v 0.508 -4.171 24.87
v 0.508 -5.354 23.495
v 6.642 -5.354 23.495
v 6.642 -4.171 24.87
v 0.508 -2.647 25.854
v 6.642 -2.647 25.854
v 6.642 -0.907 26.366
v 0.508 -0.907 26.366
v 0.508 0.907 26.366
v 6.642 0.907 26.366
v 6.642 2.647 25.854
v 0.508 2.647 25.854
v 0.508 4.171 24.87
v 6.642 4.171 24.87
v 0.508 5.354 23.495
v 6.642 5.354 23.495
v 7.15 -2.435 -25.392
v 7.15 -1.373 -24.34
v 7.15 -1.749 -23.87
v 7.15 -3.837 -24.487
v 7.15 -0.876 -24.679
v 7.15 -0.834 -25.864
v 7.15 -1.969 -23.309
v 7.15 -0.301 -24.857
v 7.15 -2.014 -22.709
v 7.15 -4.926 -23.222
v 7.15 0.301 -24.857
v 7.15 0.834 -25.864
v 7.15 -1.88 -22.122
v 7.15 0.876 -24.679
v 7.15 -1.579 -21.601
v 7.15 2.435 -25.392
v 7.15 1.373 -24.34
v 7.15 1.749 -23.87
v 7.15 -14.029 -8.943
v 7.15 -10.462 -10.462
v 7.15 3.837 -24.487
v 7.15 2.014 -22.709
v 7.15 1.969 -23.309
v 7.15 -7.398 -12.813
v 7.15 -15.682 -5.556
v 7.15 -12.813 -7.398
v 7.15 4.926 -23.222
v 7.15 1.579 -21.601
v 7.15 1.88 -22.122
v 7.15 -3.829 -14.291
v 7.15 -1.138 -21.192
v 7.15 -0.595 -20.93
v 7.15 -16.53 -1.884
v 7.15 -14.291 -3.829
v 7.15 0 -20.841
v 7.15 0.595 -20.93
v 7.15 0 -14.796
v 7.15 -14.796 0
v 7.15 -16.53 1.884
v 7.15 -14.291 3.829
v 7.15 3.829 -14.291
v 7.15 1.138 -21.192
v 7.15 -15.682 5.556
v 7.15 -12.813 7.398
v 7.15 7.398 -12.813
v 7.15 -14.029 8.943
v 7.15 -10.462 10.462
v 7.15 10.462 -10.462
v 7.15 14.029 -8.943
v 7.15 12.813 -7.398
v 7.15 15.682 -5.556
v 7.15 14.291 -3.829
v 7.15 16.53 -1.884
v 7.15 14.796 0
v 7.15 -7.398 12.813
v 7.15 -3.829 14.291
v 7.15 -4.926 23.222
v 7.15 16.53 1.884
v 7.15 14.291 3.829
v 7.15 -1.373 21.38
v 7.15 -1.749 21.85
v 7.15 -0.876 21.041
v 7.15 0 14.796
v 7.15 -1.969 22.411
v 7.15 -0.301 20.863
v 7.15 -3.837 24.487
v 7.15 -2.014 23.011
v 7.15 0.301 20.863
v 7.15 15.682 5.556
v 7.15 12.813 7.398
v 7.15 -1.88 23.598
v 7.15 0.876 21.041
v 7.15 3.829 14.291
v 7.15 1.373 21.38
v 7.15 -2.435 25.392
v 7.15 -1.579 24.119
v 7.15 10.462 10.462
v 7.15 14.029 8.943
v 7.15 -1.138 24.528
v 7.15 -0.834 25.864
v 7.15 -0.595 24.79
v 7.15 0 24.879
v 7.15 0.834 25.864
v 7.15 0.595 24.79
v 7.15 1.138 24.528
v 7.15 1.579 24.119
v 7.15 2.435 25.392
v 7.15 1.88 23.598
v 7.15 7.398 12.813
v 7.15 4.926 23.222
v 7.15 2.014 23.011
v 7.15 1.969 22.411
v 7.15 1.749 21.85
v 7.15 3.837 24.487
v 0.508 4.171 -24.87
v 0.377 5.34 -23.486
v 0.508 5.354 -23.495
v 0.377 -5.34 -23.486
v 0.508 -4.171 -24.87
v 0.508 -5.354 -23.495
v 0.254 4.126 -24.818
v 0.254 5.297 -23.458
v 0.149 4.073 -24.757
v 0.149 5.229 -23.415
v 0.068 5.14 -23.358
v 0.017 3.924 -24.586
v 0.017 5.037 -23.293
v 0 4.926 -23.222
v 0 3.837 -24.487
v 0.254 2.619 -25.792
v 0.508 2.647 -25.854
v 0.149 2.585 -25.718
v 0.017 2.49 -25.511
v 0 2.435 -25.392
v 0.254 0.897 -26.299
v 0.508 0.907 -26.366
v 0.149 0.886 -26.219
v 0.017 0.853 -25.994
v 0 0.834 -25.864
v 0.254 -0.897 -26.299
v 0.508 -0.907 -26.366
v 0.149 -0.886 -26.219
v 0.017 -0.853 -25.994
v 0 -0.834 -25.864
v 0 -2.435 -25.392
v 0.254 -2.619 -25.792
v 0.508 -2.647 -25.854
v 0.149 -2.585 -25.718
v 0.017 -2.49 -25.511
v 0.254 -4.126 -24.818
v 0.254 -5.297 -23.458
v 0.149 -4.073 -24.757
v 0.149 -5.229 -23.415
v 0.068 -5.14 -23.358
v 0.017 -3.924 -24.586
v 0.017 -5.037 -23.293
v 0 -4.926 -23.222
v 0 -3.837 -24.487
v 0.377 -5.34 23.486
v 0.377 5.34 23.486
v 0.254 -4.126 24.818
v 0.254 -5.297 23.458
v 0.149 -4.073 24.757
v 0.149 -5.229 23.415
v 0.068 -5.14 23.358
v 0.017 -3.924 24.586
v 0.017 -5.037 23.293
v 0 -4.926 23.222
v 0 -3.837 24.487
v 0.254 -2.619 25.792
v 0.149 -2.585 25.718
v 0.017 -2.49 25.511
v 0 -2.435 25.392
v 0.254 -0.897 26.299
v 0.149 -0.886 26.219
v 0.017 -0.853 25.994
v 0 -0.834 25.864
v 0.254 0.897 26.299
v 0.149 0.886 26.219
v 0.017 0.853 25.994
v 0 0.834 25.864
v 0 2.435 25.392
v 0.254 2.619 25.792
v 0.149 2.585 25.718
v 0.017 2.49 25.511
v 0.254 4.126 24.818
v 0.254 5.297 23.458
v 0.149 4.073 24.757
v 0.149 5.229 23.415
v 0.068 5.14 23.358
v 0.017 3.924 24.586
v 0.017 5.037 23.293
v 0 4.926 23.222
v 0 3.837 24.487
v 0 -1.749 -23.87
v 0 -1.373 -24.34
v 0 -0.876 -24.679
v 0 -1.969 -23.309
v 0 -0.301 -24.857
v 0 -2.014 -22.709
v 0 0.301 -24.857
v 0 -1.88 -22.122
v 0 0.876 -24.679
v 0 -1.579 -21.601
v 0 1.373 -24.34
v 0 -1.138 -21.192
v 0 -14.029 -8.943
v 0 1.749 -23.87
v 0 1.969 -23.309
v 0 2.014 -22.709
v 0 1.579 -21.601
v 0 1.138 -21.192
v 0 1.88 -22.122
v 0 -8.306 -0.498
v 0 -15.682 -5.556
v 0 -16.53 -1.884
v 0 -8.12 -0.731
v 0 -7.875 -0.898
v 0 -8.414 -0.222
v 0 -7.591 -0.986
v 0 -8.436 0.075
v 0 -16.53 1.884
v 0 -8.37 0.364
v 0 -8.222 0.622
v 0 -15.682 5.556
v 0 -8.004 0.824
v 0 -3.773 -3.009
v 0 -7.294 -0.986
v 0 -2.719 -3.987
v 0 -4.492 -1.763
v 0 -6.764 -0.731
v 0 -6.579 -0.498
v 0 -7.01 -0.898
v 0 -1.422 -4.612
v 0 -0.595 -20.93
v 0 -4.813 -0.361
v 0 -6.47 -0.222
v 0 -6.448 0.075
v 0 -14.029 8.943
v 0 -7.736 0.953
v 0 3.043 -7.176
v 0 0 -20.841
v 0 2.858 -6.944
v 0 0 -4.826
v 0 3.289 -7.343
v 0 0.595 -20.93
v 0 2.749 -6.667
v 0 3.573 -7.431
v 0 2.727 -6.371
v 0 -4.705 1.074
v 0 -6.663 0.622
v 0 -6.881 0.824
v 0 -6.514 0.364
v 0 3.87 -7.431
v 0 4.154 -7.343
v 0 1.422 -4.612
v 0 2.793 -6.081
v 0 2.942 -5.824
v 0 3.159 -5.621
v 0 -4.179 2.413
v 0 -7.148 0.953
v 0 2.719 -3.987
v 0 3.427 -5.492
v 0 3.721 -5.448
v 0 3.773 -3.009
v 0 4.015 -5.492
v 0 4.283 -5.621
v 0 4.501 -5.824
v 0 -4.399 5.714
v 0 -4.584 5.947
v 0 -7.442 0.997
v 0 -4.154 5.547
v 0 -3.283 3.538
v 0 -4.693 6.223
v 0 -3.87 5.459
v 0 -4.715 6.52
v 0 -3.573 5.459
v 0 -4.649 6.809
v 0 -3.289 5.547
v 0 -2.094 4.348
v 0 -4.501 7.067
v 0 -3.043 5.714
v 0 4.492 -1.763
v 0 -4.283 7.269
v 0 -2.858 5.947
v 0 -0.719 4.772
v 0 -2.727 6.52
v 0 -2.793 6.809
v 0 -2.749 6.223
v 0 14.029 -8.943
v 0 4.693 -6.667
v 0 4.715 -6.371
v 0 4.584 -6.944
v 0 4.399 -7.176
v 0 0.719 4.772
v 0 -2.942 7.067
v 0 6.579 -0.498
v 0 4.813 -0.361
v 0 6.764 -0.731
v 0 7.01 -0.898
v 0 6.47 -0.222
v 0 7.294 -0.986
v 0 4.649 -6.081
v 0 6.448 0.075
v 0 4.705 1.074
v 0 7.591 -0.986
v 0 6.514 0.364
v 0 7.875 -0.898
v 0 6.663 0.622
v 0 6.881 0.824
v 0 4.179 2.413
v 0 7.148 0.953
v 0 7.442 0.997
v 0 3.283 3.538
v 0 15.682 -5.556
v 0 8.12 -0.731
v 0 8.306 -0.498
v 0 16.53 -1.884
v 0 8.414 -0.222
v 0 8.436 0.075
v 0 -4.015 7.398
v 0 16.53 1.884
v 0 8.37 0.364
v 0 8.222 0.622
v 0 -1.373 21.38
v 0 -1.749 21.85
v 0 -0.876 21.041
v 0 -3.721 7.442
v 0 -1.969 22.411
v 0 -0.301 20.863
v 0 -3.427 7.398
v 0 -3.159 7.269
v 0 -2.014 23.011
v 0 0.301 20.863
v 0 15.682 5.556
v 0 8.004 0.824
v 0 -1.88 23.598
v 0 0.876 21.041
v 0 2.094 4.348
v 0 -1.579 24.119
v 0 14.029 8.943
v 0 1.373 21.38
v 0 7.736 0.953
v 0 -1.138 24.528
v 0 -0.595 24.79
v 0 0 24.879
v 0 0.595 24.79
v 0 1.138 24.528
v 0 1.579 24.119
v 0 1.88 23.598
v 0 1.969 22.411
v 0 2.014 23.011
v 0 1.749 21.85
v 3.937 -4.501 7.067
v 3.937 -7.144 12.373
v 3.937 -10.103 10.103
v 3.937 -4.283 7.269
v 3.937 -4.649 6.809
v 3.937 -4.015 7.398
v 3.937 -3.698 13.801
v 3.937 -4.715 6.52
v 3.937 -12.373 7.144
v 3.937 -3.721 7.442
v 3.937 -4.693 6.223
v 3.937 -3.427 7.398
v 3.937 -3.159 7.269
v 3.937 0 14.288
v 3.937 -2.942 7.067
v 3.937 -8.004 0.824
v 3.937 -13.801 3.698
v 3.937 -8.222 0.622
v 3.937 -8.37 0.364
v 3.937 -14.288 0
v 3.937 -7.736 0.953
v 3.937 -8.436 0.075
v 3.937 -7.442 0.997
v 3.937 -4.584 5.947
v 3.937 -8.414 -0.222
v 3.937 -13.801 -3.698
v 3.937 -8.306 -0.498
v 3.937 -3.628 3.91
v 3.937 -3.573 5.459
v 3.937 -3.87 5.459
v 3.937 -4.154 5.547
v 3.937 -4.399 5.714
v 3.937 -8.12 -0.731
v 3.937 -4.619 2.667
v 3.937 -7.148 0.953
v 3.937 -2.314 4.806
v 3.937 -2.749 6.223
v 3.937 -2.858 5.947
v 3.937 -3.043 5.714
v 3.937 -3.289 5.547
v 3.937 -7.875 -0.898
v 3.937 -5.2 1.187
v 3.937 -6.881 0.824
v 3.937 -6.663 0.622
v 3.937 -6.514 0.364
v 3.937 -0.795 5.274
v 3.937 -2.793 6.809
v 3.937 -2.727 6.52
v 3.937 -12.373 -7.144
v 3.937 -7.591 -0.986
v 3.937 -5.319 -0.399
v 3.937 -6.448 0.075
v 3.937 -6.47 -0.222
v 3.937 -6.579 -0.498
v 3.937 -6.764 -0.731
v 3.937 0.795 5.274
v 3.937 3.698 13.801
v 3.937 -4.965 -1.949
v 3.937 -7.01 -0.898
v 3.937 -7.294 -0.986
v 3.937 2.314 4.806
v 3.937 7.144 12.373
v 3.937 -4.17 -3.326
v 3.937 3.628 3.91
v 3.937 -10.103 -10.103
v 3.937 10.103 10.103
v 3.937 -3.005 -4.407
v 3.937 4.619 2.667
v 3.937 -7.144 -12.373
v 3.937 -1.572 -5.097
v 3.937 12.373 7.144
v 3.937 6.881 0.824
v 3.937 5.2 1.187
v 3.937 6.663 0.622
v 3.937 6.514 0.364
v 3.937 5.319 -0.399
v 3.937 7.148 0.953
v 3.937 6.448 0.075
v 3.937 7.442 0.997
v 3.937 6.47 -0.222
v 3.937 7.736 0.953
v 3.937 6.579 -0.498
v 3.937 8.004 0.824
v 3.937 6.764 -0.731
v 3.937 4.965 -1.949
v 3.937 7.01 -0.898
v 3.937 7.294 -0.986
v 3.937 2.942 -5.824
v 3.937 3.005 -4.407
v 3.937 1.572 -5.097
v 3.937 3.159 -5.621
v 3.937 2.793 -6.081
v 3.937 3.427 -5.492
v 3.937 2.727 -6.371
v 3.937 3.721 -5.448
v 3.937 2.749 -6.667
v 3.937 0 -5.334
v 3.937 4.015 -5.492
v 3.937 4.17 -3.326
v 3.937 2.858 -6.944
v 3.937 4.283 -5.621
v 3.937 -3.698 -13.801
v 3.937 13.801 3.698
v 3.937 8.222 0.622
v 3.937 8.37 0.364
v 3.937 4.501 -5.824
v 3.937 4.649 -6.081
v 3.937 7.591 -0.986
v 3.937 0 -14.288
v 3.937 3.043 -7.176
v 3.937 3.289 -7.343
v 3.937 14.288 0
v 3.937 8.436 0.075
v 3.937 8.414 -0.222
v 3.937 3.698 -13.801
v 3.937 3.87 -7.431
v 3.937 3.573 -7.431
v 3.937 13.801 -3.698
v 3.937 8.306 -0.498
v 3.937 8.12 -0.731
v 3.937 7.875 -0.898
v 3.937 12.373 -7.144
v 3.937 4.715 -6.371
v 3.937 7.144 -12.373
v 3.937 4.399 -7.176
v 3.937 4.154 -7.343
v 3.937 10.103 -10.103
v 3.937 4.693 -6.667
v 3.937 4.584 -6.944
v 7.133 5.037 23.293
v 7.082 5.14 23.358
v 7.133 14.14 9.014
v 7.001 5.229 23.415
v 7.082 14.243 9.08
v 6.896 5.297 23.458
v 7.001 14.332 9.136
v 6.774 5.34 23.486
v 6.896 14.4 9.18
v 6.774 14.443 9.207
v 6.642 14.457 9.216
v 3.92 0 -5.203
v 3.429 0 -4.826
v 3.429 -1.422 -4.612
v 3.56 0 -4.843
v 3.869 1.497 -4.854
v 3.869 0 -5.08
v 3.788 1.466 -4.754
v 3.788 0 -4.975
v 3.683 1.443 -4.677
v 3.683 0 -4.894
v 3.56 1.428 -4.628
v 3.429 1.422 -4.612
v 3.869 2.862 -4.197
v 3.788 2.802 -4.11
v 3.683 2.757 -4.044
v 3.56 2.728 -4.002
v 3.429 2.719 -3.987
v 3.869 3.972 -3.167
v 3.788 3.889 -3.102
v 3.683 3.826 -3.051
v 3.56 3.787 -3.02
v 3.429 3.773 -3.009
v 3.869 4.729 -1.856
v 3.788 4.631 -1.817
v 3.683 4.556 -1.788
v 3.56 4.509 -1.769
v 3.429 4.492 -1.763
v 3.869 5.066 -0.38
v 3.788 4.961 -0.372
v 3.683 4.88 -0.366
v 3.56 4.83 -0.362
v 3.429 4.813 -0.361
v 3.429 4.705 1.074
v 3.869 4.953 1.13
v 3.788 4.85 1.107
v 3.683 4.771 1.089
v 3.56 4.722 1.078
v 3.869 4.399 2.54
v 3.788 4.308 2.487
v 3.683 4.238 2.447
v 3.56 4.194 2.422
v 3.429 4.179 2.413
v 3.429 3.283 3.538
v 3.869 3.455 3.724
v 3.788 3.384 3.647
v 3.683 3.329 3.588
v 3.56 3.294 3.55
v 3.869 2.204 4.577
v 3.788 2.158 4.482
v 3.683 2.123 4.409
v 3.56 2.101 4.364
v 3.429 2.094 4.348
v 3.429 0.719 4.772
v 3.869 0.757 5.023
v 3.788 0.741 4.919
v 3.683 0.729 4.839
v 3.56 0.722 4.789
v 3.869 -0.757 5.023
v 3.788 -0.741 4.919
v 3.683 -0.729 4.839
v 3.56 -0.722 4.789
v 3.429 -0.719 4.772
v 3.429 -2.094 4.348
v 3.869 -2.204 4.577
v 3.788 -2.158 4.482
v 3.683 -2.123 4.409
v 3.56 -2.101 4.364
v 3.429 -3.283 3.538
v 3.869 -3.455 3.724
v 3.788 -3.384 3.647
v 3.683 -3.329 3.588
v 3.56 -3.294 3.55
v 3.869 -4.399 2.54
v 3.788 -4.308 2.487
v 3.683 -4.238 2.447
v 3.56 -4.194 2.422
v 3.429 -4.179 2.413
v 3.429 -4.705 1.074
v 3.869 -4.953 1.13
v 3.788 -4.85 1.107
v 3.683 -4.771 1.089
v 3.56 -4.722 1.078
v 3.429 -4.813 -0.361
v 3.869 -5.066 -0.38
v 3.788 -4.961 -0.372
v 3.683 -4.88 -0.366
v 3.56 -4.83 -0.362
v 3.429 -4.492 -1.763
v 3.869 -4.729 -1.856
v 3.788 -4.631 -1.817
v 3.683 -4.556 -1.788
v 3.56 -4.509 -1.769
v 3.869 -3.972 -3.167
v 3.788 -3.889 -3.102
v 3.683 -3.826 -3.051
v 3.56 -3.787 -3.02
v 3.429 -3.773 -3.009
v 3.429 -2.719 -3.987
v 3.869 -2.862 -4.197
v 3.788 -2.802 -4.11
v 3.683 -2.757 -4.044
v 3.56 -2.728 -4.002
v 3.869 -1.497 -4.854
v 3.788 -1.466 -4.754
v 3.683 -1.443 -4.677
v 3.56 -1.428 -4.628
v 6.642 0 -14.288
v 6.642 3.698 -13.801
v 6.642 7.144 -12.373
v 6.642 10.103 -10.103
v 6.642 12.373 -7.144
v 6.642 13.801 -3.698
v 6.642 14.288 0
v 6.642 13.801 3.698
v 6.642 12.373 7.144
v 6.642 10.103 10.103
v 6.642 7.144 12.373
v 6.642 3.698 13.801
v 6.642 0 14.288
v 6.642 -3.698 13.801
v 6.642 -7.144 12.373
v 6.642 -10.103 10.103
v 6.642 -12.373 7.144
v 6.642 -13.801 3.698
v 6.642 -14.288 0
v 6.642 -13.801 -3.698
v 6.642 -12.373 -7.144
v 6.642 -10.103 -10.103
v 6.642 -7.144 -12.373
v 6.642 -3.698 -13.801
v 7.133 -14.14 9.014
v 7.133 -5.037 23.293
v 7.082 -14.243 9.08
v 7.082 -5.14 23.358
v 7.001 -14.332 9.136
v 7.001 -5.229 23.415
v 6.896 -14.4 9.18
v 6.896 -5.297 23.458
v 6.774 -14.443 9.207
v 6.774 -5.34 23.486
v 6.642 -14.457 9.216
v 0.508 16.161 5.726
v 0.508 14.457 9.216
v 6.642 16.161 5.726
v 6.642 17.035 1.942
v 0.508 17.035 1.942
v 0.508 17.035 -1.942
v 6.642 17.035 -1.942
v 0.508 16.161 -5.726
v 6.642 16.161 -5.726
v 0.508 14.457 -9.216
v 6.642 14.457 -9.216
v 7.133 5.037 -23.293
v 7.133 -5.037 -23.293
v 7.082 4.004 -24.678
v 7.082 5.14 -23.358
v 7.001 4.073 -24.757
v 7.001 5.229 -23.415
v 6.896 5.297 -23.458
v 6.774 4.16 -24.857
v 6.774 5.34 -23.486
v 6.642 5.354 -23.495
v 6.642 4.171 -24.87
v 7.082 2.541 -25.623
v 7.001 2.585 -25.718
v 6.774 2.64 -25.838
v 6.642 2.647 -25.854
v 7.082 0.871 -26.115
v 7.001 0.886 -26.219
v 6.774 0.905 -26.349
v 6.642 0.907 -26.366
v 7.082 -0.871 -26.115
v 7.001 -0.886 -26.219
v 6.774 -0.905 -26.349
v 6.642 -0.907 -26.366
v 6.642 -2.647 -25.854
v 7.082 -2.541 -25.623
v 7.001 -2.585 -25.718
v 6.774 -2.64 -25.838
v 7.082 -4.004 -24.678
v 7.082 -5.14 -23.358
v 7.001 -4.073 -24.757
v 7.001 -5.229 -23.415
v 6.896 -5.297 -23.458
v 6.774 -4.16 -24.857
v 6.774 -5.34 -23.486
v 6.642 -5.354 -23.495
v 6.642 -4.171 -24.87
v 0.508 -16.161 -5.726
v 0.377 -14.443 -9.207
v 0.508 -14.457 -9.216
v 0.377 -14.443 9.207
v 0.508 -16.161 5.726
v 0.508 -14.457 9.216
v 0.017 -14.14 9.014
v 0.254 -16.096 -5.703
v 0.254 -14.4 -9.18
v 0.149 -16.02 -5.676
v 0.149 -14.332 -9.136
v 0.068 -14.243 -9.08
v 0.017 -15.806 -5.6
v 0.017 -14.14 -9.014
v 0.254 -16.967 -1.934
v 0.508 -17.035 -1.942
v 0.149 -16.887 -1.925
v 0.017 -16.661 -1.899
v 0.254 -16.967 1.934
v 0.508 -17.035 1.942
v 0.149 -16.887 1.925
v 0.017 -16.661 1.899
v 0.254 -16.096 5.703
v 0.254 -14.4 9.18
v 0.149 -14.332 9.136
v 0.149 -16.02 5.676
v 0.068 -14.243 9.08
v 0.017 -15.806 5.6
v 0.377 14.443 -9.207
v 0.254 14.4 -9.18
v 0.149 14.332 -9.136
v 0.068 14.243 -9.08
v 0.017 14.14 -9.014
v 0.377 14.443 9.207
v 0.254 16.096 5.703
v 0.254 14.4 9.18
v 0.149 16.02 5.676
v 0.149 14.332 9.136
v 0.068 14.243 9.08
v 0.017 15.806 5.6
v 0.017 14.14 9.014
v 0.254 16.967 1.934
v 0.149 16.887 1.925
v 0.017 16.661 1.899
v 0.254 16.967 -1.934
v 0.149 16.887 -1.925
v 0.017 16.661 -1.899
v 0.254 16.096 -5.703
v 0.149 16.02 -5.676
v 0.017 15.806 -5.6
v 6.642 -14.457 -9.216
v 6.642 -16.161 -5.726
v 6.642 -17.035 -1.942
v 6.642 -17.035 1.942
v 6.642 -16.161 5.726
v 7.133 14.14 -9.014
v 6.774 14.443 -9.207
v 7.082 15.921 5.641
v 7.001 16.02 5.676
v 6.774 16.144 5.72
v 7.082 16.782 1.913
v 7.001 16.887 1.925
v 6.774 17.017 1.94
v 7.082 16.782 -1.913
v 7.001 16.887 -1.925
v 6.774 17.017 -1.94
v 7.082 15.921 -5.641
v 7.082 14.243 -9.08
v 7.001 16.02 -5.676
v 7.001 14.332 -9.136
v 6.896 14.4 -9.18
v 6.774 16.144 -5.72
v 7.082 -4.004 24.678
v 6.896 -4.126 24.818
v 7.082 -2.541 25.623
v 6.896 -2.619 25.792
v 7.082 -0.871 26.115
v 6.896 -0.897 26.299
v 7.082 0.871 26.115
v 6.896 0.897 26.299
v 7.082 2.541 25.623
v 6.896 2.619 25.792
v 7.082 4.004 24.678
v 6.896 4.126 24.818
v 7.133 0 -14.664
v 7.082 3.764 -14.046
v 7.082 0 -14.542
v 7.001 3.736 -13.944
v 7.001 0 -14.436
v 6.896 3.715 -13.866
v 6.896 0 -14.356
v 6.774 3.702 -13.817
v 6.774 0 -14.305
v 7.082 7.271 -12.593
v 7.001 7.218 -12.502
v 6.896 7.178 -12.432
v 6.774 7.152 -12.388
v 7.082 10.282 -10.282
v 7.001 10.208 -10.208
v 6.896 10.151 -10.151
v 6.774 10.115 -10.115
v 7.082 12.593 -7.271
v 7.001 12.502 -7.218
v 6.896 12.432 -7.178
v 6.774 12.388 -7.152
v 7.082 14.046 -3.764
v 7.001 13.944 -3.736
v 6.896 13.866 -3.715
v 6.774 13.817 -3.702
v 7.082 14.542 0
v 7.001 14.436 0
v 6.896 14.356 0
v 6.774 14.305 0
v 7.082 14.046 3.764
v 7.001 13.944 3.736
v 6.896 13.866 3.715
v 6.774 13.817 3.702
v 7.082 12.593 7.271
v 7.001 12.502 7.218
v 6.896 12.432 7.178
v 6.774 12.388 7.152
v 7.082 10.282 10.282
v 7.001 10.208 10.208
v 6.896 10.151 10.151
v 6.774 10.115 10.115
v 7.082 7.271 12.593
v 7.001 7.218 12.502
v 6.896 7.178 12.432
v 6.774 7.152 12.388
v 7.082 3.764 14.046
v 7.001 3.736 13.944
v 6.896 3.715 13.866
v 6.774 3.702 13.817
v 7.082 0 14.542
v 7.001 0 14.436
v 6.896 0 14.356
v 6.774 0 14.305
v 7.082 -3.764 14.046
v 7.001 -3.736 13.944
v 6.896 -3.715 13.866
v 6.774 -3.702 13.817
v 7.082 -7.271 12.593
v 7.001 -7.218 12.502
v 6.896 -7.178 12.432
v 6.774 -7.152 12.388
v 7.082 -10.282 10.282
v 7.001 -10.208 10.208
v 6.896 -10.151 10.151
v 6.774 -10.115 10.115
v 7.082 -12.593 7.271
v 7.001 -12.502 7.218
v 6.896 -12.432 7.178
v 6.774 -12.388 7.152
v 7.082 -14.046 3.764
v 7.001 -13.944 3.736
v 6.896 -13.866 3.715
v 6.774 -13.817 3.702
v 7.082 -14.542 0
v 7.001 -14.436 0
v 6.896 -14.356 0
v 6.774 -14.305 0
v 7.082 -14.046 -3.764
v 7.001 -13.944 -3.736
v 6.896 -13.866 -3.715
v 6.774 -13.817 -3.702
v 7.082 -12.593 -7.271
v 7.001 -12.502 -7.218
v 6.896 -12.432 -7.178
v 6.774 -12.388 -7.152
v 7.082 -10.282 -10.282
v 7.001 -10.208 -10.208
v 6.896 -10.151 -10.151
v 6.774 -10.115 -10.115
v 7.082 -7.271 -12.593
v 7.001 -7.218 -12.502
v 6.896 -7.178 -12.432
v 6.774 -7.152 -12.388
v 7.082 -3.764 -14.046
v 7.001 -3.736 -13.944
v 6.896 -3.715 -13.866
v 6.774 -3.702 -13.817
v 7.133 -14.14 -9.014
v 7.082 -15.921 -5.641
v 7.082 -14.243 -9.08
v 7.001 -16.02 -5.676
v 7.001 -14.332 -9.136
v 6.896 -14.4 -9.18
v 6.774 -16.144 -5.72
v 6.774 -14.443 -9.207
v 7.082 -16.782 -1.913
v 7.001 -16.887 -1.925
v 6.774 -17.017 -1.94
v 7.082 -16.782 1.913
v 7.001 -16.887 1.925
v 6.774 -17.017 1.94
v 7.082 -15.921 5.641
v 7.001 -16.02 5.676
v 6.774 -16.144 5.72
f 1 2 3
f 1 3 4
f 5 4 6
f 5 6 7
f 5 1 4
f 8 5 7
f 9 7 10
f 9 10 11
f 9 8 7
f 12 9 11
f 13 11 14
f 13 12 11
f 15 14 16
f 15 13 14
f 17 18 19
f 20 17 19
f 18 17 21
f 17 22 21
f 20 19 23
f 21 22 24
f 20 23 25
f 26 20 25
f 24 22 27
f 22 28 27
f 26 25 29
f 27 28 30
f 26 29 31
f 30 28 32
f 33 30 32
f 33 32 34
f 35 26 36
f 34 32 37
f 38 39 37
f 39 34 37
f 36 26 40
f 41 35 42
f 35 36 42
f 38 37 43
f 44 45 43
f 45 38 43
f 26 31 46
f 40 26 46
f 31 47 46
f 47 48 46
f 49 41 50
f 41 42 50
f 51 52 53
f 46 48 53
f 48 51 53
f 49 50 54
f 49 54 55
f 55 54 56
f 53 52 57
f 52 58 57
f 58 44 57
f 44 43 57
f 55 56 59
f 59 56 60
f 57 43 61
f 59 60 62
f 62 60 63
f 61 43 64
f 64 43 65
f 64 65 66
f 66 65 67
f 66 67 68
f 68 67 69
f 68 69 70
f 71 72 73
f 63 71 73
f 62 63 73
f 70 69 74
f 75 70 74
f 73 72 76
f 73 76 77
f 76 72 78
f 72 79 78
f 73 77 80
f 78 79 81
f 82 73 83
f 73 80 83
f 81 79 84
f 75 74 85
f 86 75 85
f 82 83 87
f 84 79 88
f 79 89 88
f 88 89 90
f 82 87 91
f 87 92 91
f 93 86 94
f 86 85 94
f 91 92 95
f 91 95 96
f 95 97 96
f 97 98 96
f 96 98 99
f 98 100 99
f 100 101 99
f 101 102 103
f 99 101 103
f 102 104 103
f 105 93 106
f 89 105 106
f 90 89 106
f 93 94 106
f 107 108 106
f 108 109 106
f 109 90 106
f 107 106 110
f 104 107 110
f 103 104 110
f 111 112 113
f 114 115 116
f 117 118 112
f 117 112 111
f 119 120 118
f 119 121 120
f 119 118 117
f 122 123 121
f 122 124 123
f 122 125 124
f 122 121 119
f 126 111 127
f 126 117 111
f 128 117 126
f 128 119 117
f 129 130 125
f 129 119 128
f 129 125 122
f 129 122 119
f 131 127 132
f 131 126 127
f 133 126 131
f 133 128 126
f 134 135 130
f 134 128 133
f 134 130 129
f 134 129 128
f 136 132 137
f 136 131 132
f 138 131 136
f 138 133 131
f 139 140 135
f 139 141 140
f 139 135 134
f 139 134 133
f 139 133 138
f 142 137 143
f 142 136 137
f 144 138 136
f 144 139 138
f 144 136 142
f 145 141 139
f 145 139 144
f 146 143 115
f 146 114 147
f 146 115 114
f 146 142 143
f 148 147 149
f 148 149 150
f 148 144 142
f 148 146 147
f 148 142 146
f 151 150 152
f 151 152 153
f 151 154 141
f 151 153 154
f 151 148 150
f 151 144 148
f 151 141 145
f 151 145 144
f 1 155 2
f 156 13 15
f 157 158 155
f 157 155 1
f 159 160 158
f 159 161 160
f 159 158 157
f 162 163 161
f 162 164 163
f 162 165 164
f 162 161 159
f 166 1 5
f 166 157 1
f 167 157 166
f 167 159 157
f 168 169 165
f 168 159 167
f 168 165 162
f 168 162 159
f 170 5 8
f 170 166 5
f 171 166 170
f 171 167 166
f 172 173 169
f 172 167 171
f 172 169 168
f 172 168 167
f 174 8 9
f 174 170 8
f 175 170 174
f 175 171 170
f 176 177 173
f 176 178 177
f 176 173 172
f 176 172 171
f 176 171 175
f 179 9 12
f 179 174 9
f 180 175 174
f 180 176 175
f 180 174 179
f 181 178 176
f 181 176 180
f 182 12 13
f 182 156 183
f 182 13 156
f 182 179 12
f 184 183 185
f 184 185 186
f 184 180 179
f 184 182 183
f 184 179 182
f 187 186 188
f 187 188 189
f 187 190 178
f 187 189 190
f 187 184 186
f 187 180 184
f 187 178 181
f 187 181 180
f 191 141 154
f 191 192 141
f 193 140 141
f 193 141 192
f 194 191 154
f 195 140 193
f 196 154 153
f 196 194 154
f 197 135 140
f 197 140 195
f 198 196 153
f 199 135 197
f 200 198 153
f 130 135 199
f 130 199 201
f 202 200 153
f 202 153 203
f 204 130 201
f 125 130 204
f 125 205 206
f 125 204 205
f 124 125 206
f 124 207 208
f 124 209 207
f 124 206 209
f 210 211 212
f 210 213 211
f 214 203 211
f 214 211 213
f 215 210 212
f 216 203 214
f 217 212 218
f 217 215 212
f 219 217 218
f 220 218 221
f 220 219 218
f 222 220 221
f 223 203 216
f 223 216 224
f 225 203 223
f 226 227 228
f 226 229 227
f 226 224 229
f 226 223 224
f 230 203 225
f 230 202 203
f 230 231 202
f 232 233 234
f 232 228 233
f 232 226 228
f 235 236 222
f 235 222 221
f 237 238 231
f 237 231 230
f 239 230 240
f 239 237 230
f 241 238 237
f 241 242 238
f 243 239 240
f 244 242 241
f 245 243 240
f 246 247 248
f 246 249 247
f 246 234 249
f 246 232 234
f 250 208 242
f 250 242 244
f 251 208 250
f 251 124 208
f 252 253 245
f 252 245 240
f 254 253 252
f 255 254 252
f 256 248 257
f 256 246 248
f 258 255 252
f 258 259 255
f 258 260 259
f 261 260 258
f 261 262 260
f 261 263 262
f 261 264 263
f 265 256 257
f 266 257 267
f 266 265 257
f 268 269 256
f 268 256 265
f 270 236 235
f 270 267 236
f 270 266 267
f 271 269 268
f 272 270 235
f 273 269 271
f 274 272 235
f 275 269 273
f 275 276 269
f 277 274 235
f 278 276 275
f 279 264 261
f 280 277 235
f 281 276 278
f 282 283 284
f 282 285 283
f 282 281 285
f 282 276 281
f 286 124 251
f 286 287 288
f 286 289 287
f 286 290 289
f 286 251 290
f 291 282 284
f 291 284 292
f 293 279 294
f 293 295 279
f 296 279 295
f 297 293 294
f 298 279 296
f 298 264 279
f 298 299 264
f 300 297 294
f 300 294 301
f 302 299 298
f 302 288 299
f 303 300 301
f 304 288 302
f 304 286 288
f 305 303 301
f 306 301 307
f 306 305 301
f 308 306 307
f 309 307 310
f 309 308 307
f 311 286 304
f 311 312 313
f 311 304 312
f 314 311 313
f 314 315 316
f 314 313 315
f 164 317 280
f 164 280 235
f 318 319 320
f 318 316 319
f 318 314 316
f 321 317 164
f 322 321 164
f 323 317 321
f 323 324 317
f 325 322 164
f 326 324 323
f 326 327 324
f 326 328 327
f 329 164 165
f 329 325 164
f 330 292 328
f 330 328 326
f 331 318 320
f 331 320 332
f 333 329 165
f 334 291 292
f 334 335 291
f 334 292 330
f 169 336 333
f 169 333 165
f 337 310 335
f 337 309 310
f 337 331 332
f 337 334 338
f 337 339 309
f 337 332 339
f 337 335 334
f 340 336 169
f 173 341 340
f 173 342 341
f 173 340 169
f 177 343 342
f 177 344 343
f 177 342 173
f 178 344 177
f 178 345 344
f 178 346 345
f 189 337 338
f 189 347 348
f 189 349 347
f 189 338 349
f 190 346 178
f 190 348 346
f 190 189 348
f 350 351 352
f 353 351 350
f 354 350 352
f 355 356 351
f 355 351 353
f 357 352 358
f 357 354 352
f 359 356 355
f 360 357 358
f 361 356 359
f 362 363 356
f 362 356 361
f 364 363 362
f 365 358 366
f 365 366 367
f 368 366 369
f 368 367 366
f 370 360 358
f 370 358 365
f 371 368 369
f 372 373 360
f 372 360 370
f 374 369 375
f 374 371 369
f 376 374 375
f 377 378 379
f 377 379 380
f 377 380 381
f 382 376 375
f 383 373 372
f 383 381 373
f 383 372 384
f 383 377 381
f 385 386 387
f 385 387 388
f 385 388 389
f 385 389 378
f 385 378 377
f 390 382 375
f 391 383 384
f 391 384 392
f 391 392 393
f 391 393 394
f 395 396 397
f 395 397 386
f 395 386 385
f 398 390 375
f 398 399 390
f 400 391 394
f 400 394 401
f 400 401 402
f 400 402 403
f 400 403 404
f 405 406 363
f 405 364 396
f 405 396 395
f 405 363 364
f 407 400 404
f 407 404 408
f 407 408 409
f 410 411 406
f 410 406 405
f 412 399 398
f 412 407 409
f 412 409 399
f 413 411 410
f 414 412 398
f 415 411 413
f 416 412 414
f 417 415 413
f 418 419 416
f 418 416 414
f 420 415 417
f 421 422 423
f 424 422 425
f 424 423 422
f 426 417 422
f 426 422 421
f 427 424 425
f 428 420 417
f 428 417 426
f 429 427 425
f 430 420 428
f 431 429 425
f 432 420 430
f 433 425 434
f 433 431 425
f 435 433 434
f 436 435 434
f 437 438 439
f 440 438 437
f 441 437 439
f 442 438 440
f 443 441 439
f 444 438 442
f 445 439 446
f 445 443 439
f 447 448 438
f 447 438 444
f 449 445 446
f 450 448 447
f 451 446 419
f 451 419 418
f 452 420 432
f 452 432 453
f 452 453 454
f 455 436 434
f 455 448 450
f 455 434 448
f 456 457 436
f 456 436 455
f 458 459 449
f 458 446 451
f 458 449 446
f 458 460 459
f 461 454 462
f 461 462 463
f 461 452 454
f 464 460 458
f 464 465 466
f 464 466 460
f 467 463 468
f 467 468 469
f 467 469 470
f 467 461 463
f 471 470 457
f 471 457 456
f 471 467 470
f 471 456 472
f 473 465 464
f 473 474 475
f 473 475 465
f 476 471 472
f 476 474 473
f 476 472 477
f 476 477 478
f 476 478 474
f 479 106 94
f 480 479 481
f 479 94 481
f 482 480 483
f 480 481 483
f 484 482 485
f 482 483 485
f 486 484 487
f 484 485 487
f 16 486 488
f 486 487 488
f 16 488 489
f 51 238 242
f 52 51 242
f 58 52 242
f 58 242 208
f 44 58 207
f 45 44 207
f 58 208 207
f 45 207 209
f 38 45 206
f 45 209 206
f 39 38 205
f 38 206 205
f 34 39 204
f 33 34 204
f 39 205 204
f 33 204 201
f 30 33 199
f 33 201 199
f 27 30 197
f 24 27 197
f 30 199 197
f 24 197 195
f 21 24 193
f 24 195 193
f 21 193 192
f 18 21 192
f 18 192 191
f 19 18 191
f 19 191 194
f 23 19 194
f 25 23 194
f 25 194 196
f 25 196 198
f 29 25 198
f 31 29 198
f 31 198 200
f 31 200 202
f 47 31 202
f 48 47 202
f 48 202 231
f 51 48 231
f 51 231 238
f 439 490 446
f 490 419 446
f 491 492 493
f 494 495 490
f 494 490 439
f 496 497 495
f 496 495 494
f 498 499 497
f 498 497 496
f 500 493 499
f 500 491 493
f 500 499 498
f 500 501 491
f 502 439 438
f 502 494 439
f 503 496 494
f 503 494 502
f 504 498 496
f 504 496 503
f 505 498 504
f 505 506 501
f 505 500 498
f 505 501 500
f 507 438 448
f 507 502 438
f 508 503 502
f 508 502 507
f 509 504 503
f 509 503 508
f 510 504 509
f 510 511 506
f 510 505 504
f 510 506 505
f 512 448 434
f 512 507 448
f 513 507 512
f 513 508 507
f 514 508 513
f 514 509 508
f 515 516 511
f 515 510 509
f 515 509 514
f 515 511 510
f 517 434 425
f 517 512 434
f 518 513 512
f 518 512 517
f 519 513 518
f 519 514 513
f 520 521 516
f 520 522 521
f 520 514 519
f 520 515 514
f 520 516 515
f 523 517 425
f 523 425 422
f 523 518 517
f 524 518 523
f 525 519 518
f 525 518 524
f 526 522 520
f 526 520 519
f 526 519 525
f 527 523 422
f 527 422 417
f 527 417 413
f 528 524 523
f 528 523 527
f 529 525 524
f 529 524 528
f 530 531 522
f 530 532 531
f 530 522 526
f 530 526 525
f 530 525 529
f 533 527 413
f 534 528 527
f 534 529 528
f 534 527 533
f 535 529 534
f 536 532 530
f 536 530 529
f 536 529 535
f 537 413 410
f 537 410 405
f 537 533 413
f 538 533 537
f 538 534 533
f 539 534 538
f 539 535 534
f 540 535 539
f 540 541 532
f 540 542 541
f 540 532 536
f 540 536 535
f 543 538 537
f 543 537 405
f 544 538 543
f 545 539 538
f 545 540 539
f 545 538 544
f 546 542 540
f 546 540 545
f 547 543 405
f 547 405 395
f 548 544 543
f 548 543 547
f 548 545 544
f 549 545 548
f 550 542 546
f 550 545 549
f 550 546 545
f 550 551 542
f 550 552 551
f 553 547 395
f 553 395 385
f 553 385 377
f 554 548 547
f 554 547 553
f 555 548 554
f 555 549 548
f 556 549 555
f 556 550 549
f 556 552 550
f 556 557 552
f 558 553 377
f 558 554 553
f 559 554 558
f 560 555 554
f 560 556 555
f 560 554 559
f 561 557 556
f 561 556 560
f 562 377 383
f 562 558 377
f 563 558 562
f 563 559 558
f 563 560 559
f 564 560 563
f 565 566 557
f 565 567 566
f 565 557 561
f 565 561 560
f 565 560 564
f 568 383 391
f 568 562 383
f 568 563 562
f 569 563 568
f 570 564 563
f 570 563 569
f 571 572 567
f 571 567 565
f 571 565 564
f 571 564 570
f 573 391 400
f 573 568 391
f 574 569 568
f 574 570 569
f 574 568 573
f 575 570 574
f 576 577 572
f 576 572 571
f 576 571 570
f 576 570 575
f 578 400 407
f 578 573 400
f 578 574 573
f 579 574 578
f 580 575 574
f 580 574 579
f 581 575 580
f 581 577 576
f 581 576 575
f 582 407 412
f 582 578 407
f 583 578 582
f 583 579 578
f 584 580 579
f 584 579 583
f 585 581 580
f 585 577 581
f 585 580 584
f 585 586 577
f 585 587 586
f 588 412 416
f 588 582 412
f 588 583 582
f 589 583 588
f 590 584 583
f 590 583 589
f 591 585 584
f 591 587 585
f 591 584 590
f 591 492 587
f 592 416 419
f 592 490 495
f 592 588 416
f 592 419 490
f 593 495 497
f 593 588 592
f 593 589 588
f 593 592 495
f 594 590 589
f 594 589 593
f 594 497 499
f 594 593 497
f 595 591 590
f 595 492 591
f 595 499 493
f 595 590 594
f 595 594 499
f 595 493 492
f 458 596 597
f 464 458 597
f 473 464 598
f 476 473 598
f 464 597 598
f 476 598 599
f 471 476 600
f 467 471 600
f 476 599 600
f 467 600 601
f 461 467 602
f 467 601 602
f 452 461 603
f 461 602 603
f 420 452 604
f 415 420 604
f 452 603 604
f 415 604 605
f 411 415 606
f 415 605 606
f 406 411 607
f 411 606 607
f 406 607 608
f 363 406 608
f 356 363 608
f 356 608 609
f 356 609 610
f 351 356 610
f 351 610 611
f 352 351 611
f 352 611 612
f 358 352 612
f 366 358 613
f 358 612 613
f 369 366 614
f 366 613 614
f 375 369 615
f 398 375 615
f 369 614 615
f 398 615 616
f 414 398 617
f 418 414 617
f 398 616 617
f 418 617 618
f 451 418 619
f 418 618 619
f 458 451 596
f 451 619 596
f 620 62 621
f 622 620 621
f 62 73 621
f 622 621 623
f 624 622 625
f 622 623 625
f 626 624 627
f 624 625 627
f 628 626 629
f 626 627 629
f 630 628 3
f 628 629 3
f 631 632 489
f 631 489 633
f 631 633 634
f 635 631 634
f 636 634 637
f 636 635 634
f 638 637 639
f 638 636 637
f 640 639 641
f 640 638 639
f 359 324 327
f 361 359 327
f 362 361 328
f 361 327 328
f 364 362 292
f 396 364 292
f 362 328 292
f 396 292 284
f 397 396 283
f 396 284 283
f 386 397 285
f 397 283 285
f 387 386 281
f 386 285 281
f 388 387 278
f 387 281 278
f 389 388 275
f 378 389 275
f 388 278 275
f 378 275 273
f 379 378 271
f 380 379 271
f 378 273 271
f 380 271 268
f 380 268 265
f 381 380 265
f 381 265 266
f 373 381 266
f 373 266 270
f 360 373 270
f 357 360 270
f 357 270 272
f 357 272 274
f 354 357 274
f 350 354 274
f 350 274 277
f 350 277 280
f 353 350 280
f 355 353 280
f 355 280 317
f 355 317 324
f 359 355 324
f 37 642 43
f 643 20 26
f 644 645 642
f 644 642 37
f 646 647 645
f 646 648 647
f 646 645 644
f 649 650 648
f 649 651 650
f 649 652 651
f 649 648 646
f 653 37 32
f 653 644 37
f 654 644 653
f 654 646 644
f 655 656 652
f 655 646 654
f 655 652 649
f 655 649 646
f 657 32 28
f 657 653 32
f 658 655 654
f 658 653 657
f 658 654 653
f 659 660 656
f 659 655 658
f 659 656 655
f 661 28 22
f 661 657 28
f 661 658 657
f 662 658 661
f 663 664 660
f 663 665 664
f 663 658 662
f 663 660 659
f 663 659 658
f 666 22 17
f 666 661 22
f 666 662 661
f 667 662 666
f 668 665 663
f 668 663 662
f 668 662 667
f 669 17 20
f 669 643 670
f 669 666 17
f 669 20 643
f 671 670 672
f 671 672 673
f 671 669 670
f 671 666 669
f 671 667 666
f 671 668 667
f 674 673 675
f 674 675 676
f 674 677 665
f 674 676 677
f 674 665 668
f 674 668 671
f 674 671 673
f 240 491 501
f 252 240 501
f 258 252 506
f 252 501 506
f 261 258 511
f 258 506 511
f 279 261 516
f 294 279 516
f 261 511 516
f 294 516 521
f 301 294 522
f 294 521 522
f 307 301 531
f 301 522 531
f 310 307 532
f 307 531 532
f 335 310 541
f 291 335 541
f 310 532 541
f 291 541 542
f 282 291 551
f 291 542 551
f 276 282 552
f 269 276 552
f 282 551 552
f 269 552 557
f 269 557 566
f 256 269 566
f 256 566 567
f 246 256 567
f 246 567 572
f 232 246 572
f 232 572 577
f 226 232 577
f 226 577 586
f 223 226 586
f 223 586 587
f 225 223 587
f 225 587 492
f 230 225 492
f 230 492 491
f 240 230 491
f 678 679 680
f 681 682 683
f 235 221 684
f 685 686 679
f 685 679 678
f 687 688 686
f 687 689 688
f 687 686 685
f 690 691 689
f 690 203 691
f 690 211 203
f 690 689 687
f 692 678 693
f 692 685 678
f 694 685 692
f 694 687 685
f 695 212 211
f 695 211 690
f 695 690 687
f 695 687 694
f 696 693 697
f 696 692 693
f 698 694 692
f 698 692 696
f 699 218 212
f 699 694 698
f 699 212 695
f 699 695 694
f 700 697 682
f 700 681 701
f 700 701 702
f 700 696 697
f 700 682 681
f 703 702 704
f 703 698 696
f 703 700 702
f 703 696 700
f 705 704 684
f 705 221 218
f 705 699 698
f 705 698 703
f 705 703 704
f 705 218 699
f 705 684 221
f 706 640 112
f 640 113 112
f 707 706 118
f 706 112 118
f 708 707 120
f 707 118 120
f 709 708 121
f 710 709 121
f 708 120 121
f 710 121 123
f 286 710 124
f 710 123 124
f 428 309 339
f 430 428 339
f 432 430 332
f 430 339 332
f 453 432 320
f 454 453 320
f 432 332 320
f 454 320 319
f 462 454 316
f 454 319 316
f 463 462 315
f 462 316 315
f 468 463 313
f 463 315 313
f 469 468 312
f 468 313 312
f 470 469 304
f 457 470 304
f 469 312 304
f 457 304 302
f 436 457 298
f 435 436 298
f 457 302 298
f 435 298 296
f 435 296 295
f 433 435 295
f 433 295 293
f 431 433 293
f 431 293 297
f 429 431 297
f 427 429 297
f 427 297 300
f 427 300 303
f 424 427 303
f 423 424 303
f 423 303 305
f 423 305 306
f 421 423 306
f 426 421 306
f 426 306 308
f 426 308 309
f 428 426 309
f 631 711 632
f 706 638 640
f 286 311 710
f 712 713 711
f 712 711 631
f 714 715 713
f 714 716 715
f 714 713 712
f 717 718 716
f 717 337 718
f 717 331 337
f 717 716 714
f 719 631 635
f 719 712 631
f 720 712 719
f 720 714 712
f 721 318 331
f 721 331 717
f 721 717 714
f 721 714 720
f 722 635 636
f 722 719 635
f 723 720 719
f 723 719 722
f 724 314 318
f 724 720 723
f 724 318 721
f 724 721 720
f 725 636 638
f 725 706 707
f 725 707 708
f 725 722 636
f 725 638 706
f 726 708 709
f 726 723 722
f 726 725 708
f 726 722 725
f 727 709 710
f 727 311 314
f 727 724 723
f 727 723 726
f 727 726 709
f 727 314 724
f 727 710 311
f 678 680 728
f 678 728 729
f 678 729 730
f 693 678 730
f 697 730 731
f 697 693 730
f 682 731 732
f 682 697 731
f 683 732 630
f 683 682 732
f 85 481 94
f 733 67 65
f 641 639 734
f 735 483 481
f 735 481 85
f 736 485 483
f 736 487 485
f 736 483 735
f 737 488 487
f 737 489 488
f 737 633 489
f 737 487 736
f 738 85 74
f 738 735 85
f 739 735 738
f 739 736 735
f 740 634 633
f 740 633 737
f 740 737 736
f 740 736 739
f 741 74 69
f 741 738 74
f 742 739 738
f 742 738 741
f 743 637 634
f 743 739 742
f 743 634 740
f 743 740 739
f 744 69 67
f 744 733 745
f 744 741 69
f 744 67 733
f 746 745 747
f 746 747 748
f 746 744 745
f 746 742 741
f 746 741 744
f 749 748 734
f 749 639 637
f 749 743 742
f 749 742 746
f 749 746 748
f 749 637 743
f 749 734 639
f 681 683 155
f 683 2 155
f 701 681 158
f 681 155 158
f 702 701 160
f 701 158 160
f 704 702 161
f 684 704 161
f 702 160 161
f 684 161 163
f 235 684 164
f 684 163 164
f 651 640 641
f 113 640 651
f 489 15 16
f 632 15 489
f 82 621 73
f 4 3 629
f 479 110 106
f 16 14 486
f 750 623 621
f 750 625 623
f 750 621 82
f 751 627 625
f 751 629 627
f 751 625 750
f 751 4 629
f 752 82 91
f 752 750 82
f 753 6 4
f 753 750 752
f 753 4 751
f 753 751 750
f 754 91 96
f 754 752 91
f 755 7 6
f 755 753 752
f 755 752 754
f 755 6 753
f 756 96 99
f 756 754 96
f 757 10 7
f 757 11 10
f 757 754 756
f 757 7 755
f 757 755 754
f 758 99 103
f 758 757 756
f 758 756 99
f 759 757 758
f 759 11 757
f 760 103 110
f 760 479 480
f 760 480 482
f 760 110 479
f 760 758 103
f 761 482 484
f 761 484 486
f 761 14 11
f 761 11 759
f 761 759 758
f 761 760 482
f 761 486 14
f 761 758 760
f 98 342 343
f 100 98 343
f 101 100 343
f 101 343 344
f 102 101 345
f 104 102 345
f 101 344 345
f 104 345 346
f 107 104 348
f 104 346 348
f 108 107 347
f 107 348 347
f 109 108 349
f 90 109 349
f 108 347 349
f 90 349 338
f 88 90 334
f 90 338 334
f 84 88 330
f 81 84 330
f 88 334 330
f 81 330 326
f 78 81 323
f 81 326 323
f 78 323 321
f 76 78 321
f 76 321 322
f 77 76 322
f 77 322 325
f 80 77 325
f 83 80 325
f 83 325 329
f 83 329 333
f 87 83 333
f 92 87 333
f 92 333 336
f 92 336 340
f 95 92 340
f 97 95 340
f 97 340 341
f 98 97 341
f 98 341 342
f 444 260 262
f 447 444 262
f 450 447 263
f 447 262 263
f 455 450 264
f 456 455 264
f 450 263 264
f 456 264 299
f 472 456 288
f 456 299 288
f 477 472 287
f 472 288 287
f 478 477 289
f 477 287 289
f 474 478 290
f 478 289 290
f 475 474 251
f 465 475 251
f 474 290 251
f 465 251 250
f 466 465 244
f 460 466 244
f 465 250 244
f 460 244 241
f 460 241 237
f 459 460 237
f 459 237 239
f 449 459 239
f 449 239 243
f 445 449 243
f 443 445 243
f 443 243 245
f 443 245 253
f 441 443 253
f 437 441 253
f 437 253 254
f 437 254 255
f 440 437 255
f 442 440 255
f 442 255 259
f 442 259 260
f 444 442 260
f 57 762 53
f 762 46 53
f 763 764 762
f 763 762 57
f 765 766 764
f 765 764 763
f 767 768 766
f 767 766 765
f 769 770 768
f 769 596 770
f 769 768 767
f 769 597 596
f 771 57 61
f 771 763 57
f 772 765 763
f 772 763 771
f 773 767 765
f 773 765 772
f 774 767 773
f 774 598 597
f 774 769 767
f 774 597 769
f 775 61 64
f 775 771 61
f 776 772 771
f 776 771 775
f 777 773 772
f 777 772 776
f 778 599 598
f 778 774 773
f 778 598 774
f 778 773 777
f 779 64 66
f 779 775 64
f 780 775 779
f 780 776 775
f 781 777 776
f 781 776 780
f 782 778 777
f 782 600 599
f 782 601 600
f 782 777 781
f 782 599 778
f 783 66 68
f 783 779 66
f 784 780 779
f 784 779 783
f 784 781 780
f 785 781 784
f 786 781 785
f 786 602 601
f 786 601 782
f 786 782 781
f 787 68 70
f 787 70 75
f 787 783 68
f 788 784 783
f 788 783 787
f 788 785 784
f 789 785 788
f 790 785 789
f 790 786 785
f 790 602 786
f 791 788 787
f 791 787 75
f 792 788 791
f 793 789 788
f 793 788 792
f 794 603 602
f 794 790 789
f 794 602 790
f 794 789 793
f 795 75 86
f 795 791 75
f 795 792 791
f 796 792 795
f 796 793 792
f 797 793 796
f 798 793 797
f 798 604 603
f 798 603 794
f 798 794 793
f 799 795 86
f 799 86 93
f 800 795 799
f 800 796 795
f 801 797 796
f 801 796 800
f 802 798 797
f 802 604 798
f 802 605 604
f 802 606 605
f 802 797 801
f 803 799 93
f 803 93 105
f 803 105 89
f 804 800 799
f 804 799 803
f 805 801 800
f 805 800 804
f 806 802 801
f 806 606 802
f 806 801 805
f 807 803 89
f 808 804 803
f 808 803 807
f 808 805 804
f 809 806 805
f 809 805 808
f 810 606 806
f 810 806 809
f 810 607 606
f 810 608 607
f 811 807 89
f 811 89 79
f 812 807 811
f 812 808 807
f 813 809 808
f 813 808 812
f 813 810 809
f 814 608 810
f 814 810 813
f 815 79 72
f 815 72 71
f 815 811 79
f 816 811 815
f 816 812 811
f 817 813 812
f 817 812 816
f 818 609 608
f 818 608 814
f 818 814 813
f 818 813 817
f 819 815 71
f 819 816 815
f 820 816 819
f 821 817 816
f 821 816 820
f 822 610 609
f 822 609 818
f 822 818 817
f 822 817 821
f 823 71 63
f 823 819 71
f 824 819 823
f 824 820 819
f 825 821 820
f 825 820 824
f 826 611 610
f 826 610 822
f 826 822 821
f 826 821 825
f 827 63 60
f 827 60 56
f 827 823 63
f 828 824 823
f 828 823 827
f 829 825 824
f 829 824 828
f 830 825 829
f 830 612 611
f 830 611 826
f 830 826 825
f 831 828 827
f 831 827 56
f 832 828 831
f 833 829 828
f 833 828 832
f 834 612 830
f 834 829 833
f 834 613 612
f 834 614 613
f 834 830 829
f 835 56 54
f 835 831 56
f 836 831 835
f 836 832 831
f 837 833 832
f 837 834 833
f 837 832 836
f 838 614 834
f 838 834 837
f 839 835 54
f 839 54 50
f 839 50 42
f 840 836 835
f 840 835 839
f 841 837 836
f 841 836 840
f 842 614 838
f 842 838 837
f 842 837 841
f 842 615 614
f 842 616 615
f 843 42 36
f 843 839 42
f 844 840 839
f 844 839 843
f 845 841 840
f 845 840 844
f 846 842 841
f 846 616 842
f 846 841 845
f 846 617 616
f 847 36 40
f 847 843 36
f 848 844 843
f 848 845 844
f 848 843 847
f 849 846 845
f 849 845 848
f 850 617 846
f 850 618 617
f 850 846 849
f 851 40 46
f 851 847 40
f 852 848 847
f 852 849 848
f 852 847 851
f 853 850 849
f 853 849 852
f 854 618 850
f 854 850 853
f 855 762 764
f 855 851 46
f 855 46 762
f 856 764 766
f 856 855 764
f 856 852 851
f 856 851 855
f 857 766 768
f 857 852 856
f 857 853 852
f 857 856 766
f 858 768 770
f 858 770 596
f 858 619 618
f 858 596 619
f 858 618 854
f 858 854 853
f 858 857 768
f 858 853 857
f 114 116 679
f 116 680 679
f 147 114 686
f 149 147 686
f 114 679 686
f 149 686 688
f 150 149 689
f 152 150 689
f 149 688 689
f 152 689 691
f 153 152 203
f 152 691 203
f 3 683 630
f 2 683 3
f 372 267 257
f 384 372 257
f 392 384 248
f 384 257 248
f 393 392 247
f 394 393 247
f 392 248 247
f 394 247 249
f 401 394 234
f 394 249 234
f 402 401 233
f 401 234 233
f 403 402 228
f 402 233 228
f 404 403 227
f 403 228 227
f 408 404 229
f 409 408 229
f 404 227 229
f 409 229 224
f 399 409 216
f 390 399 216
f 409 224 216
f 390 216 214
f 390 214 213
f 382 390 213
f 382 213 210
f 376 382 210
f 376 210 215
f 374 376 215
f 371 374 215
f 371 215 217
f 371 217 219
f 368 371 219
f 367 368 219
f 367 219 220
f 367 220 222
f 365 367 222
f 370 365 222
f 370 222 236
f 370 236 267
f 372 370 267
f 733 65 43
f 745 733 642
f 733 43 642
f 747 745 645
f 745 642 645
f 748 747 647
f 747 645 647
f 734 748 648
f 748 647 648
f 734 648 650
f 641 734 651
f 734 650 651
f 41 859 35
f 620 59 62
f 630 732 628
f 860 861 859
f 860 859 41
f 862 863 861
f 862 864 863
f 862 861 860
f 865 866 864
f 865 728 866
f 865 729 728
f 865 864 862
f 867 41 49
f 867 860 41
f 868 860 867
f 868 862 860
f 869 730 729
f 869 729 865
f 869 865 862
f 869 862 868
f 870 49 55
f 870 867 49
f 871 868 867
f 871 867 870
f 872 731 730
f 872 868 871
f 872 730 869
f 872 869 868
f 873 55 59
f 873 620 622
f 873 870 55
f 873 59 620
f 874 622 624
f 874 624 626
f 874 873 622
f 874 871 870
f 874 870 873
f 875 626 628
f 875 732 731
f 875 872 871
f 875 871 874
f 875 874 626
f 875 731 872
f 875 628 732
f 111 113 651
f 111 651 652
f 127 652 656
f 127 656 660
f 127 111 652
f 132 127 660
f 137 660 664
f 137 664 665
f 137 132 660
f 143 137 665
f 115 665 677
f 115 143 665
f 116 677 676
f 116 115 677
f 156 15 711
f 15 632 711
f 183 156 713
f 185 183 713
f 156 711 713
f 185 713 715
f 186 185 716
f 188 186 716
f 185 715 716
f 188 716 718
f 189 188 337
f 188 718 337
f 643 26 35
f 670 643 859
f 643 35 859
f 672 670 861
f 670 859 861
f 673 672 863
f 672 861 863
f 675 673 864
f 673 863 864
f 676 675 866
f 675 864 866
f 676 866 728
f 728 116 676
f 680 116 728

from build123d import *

# Parameters (mm, degrees)
BOSS_EXTRUDE3_DEPTH        = 7.1501
SKETCH5_R                  = 4.826
CUT_EXTRUDE4_DEPTH         = 33.306330486
SKETCH6_R                  = 14.2875
CUT_EXTRUDE5_DEPTH         = 3.2131
TAP_DRILL_FOR_3_48_TAP2_D  = 1.9939
TAP_DRILL_FOR_10_32_TAP3_D = 4.0386
FILLET3_R                  = 0.508
FILLET4_R                  = 0.508
FILLET5_R                  = 0.508
FILLET6_R                  = 0.508


with BuildPart() as part:
    # Sketch1 → Boss-Extrude3 (new body)
    with BuildSketch(Plane(origin=(0, 0, 0), x_dir=(0, 0, -1), z_dir=(1, 0, 0))):
        with BuildLine():
            Line((9.216458059, 14.457106413), (23.495, 5.354483857))
            ThreePointArc((23.495, 5.354483857), (26.431497015, 0), (23.495, -5.354483857))
            Line((23.495, -5.354483857), (9.216458059, -14.457106413))
            ThreePointArc((9.216458059, -14.457106413), (0, -17.145), (-9.216458059, -14.457106413))
            Line((-9.216458059, -14.457106413), (-23.495, -5.354483857))
            ThreePointArc((-23.495, -5.354483857), (-26.431497015, 0), (-23.495, 5.354483857))
            Line((-23.495, 5.354483857), (-9.216458059, 14.457106413))
            ThreePointArc((-9.216458059, 14.457106413), (0, 17.145), (9.216458059, 14.457106413))
        make_face()
    extrude(amount=BOSS_EXTRUDE3_DEPTH)

    # Sketch5 → Cut-Extrude4 (cut, through all)
    with BuildSketch(Plane(origin=(7.1501, 0, 0), x_dir=(0, 0, -1), z_dir=(1, 0, 0))):
        Circle(SKETCH5_R)
    extrude(amount=-CUT_EXTRUDE4_DEPTH, mode=Mode.SUBTRACT)

    # Sketch6 → Cut-Extrude5 (cut)
    with BuildSketch(Plane(origin=(7.1501, 0, 0), x_dir=(0, 0, -1), z_dir=(1, 0, 0))):
        Circle(SKETCH6_R)
    extrude(amount=-CUT_EXTRUDE5_DEPTH, mode=Mode.SUBTRACT)

    # Tap Drill for #3-48 Tap2 (through all)
    with Locations(Plane(origin=(3.937, 0, 0), x_dir=(0, 0, -1), z_dir=(1, 0, 0))):
        with Locations((0, 7.4422), (0, -7.4422), (6.44513426, 3.7211), (-6.44513426, -3.7211)):
            Hole(TAP_DRILL_FOR_3_48_TAP2_D / 2)

    # Tap Drill for #10-32 Tap3 (through all)
    with Locations(Plane(origin=(7.1501, 0, 0), x_dir=(0, 0, -1), z_dir=(1, 0, 0))):
        with Locations((-22.86, 0), (22.86, 0)):
            Hole(TAP_DRILL_FOR_10_32_TAP3_D / 2)

    # Fillet3
    fillet3_edges = [part.edges().sort_by_distance(p)[0] for p in [
        (7.1501, 0, 14.2875),
    ]]
    fillet(fillet3_edges, radius=FILLET3_R)

    # Fillet4
    fillet4_edges = [part.edges().sort_by_distance(p)[0] for p in [
        (3.937, 0, 4.826),
    ]]
    fillet(fillet4_edges, radius=FILLET4_R)

    # Fillet5
    fillet5_edges = [part.edges().sort_by_distance(p)[0] for p in [
        (7.1501, 0, 26.431497015),
        (7.1501, -9.905795135, 16.355729029),
        (7.1501, -17.145, 0),
        (7.1501, -9.905795135, -16.355729029),
        (7.1501, 0, -26.431497015),
        (7.1501, 9.905795135, -16.355729029),
        (7.1501, 17.145, 0),
        (7.1501, 9.905795135, 16.355729029),
    ]]
    fillet(fillet5_edges, radius=FILLET5_R)

    # Fillet6
    fillet6_edges = [part.edges().sort_by_distance(p)[0] for p in [
        (0, 9.905795135, 16.355729029),
        (0, 17.145, 0),
        (0, 9.905795135, -16.355729029),
        (0, 0, -26.431497015),
        (0, -9.905795135, -16.355729029),
        (0, -17.145, 0),
        (0, -9.905795135, 16.355729029),
        (0, 0, 26.431497015),
    ]]
    fillet(fillet6_edges, radius=FILLET6_R)


solid = part.part
